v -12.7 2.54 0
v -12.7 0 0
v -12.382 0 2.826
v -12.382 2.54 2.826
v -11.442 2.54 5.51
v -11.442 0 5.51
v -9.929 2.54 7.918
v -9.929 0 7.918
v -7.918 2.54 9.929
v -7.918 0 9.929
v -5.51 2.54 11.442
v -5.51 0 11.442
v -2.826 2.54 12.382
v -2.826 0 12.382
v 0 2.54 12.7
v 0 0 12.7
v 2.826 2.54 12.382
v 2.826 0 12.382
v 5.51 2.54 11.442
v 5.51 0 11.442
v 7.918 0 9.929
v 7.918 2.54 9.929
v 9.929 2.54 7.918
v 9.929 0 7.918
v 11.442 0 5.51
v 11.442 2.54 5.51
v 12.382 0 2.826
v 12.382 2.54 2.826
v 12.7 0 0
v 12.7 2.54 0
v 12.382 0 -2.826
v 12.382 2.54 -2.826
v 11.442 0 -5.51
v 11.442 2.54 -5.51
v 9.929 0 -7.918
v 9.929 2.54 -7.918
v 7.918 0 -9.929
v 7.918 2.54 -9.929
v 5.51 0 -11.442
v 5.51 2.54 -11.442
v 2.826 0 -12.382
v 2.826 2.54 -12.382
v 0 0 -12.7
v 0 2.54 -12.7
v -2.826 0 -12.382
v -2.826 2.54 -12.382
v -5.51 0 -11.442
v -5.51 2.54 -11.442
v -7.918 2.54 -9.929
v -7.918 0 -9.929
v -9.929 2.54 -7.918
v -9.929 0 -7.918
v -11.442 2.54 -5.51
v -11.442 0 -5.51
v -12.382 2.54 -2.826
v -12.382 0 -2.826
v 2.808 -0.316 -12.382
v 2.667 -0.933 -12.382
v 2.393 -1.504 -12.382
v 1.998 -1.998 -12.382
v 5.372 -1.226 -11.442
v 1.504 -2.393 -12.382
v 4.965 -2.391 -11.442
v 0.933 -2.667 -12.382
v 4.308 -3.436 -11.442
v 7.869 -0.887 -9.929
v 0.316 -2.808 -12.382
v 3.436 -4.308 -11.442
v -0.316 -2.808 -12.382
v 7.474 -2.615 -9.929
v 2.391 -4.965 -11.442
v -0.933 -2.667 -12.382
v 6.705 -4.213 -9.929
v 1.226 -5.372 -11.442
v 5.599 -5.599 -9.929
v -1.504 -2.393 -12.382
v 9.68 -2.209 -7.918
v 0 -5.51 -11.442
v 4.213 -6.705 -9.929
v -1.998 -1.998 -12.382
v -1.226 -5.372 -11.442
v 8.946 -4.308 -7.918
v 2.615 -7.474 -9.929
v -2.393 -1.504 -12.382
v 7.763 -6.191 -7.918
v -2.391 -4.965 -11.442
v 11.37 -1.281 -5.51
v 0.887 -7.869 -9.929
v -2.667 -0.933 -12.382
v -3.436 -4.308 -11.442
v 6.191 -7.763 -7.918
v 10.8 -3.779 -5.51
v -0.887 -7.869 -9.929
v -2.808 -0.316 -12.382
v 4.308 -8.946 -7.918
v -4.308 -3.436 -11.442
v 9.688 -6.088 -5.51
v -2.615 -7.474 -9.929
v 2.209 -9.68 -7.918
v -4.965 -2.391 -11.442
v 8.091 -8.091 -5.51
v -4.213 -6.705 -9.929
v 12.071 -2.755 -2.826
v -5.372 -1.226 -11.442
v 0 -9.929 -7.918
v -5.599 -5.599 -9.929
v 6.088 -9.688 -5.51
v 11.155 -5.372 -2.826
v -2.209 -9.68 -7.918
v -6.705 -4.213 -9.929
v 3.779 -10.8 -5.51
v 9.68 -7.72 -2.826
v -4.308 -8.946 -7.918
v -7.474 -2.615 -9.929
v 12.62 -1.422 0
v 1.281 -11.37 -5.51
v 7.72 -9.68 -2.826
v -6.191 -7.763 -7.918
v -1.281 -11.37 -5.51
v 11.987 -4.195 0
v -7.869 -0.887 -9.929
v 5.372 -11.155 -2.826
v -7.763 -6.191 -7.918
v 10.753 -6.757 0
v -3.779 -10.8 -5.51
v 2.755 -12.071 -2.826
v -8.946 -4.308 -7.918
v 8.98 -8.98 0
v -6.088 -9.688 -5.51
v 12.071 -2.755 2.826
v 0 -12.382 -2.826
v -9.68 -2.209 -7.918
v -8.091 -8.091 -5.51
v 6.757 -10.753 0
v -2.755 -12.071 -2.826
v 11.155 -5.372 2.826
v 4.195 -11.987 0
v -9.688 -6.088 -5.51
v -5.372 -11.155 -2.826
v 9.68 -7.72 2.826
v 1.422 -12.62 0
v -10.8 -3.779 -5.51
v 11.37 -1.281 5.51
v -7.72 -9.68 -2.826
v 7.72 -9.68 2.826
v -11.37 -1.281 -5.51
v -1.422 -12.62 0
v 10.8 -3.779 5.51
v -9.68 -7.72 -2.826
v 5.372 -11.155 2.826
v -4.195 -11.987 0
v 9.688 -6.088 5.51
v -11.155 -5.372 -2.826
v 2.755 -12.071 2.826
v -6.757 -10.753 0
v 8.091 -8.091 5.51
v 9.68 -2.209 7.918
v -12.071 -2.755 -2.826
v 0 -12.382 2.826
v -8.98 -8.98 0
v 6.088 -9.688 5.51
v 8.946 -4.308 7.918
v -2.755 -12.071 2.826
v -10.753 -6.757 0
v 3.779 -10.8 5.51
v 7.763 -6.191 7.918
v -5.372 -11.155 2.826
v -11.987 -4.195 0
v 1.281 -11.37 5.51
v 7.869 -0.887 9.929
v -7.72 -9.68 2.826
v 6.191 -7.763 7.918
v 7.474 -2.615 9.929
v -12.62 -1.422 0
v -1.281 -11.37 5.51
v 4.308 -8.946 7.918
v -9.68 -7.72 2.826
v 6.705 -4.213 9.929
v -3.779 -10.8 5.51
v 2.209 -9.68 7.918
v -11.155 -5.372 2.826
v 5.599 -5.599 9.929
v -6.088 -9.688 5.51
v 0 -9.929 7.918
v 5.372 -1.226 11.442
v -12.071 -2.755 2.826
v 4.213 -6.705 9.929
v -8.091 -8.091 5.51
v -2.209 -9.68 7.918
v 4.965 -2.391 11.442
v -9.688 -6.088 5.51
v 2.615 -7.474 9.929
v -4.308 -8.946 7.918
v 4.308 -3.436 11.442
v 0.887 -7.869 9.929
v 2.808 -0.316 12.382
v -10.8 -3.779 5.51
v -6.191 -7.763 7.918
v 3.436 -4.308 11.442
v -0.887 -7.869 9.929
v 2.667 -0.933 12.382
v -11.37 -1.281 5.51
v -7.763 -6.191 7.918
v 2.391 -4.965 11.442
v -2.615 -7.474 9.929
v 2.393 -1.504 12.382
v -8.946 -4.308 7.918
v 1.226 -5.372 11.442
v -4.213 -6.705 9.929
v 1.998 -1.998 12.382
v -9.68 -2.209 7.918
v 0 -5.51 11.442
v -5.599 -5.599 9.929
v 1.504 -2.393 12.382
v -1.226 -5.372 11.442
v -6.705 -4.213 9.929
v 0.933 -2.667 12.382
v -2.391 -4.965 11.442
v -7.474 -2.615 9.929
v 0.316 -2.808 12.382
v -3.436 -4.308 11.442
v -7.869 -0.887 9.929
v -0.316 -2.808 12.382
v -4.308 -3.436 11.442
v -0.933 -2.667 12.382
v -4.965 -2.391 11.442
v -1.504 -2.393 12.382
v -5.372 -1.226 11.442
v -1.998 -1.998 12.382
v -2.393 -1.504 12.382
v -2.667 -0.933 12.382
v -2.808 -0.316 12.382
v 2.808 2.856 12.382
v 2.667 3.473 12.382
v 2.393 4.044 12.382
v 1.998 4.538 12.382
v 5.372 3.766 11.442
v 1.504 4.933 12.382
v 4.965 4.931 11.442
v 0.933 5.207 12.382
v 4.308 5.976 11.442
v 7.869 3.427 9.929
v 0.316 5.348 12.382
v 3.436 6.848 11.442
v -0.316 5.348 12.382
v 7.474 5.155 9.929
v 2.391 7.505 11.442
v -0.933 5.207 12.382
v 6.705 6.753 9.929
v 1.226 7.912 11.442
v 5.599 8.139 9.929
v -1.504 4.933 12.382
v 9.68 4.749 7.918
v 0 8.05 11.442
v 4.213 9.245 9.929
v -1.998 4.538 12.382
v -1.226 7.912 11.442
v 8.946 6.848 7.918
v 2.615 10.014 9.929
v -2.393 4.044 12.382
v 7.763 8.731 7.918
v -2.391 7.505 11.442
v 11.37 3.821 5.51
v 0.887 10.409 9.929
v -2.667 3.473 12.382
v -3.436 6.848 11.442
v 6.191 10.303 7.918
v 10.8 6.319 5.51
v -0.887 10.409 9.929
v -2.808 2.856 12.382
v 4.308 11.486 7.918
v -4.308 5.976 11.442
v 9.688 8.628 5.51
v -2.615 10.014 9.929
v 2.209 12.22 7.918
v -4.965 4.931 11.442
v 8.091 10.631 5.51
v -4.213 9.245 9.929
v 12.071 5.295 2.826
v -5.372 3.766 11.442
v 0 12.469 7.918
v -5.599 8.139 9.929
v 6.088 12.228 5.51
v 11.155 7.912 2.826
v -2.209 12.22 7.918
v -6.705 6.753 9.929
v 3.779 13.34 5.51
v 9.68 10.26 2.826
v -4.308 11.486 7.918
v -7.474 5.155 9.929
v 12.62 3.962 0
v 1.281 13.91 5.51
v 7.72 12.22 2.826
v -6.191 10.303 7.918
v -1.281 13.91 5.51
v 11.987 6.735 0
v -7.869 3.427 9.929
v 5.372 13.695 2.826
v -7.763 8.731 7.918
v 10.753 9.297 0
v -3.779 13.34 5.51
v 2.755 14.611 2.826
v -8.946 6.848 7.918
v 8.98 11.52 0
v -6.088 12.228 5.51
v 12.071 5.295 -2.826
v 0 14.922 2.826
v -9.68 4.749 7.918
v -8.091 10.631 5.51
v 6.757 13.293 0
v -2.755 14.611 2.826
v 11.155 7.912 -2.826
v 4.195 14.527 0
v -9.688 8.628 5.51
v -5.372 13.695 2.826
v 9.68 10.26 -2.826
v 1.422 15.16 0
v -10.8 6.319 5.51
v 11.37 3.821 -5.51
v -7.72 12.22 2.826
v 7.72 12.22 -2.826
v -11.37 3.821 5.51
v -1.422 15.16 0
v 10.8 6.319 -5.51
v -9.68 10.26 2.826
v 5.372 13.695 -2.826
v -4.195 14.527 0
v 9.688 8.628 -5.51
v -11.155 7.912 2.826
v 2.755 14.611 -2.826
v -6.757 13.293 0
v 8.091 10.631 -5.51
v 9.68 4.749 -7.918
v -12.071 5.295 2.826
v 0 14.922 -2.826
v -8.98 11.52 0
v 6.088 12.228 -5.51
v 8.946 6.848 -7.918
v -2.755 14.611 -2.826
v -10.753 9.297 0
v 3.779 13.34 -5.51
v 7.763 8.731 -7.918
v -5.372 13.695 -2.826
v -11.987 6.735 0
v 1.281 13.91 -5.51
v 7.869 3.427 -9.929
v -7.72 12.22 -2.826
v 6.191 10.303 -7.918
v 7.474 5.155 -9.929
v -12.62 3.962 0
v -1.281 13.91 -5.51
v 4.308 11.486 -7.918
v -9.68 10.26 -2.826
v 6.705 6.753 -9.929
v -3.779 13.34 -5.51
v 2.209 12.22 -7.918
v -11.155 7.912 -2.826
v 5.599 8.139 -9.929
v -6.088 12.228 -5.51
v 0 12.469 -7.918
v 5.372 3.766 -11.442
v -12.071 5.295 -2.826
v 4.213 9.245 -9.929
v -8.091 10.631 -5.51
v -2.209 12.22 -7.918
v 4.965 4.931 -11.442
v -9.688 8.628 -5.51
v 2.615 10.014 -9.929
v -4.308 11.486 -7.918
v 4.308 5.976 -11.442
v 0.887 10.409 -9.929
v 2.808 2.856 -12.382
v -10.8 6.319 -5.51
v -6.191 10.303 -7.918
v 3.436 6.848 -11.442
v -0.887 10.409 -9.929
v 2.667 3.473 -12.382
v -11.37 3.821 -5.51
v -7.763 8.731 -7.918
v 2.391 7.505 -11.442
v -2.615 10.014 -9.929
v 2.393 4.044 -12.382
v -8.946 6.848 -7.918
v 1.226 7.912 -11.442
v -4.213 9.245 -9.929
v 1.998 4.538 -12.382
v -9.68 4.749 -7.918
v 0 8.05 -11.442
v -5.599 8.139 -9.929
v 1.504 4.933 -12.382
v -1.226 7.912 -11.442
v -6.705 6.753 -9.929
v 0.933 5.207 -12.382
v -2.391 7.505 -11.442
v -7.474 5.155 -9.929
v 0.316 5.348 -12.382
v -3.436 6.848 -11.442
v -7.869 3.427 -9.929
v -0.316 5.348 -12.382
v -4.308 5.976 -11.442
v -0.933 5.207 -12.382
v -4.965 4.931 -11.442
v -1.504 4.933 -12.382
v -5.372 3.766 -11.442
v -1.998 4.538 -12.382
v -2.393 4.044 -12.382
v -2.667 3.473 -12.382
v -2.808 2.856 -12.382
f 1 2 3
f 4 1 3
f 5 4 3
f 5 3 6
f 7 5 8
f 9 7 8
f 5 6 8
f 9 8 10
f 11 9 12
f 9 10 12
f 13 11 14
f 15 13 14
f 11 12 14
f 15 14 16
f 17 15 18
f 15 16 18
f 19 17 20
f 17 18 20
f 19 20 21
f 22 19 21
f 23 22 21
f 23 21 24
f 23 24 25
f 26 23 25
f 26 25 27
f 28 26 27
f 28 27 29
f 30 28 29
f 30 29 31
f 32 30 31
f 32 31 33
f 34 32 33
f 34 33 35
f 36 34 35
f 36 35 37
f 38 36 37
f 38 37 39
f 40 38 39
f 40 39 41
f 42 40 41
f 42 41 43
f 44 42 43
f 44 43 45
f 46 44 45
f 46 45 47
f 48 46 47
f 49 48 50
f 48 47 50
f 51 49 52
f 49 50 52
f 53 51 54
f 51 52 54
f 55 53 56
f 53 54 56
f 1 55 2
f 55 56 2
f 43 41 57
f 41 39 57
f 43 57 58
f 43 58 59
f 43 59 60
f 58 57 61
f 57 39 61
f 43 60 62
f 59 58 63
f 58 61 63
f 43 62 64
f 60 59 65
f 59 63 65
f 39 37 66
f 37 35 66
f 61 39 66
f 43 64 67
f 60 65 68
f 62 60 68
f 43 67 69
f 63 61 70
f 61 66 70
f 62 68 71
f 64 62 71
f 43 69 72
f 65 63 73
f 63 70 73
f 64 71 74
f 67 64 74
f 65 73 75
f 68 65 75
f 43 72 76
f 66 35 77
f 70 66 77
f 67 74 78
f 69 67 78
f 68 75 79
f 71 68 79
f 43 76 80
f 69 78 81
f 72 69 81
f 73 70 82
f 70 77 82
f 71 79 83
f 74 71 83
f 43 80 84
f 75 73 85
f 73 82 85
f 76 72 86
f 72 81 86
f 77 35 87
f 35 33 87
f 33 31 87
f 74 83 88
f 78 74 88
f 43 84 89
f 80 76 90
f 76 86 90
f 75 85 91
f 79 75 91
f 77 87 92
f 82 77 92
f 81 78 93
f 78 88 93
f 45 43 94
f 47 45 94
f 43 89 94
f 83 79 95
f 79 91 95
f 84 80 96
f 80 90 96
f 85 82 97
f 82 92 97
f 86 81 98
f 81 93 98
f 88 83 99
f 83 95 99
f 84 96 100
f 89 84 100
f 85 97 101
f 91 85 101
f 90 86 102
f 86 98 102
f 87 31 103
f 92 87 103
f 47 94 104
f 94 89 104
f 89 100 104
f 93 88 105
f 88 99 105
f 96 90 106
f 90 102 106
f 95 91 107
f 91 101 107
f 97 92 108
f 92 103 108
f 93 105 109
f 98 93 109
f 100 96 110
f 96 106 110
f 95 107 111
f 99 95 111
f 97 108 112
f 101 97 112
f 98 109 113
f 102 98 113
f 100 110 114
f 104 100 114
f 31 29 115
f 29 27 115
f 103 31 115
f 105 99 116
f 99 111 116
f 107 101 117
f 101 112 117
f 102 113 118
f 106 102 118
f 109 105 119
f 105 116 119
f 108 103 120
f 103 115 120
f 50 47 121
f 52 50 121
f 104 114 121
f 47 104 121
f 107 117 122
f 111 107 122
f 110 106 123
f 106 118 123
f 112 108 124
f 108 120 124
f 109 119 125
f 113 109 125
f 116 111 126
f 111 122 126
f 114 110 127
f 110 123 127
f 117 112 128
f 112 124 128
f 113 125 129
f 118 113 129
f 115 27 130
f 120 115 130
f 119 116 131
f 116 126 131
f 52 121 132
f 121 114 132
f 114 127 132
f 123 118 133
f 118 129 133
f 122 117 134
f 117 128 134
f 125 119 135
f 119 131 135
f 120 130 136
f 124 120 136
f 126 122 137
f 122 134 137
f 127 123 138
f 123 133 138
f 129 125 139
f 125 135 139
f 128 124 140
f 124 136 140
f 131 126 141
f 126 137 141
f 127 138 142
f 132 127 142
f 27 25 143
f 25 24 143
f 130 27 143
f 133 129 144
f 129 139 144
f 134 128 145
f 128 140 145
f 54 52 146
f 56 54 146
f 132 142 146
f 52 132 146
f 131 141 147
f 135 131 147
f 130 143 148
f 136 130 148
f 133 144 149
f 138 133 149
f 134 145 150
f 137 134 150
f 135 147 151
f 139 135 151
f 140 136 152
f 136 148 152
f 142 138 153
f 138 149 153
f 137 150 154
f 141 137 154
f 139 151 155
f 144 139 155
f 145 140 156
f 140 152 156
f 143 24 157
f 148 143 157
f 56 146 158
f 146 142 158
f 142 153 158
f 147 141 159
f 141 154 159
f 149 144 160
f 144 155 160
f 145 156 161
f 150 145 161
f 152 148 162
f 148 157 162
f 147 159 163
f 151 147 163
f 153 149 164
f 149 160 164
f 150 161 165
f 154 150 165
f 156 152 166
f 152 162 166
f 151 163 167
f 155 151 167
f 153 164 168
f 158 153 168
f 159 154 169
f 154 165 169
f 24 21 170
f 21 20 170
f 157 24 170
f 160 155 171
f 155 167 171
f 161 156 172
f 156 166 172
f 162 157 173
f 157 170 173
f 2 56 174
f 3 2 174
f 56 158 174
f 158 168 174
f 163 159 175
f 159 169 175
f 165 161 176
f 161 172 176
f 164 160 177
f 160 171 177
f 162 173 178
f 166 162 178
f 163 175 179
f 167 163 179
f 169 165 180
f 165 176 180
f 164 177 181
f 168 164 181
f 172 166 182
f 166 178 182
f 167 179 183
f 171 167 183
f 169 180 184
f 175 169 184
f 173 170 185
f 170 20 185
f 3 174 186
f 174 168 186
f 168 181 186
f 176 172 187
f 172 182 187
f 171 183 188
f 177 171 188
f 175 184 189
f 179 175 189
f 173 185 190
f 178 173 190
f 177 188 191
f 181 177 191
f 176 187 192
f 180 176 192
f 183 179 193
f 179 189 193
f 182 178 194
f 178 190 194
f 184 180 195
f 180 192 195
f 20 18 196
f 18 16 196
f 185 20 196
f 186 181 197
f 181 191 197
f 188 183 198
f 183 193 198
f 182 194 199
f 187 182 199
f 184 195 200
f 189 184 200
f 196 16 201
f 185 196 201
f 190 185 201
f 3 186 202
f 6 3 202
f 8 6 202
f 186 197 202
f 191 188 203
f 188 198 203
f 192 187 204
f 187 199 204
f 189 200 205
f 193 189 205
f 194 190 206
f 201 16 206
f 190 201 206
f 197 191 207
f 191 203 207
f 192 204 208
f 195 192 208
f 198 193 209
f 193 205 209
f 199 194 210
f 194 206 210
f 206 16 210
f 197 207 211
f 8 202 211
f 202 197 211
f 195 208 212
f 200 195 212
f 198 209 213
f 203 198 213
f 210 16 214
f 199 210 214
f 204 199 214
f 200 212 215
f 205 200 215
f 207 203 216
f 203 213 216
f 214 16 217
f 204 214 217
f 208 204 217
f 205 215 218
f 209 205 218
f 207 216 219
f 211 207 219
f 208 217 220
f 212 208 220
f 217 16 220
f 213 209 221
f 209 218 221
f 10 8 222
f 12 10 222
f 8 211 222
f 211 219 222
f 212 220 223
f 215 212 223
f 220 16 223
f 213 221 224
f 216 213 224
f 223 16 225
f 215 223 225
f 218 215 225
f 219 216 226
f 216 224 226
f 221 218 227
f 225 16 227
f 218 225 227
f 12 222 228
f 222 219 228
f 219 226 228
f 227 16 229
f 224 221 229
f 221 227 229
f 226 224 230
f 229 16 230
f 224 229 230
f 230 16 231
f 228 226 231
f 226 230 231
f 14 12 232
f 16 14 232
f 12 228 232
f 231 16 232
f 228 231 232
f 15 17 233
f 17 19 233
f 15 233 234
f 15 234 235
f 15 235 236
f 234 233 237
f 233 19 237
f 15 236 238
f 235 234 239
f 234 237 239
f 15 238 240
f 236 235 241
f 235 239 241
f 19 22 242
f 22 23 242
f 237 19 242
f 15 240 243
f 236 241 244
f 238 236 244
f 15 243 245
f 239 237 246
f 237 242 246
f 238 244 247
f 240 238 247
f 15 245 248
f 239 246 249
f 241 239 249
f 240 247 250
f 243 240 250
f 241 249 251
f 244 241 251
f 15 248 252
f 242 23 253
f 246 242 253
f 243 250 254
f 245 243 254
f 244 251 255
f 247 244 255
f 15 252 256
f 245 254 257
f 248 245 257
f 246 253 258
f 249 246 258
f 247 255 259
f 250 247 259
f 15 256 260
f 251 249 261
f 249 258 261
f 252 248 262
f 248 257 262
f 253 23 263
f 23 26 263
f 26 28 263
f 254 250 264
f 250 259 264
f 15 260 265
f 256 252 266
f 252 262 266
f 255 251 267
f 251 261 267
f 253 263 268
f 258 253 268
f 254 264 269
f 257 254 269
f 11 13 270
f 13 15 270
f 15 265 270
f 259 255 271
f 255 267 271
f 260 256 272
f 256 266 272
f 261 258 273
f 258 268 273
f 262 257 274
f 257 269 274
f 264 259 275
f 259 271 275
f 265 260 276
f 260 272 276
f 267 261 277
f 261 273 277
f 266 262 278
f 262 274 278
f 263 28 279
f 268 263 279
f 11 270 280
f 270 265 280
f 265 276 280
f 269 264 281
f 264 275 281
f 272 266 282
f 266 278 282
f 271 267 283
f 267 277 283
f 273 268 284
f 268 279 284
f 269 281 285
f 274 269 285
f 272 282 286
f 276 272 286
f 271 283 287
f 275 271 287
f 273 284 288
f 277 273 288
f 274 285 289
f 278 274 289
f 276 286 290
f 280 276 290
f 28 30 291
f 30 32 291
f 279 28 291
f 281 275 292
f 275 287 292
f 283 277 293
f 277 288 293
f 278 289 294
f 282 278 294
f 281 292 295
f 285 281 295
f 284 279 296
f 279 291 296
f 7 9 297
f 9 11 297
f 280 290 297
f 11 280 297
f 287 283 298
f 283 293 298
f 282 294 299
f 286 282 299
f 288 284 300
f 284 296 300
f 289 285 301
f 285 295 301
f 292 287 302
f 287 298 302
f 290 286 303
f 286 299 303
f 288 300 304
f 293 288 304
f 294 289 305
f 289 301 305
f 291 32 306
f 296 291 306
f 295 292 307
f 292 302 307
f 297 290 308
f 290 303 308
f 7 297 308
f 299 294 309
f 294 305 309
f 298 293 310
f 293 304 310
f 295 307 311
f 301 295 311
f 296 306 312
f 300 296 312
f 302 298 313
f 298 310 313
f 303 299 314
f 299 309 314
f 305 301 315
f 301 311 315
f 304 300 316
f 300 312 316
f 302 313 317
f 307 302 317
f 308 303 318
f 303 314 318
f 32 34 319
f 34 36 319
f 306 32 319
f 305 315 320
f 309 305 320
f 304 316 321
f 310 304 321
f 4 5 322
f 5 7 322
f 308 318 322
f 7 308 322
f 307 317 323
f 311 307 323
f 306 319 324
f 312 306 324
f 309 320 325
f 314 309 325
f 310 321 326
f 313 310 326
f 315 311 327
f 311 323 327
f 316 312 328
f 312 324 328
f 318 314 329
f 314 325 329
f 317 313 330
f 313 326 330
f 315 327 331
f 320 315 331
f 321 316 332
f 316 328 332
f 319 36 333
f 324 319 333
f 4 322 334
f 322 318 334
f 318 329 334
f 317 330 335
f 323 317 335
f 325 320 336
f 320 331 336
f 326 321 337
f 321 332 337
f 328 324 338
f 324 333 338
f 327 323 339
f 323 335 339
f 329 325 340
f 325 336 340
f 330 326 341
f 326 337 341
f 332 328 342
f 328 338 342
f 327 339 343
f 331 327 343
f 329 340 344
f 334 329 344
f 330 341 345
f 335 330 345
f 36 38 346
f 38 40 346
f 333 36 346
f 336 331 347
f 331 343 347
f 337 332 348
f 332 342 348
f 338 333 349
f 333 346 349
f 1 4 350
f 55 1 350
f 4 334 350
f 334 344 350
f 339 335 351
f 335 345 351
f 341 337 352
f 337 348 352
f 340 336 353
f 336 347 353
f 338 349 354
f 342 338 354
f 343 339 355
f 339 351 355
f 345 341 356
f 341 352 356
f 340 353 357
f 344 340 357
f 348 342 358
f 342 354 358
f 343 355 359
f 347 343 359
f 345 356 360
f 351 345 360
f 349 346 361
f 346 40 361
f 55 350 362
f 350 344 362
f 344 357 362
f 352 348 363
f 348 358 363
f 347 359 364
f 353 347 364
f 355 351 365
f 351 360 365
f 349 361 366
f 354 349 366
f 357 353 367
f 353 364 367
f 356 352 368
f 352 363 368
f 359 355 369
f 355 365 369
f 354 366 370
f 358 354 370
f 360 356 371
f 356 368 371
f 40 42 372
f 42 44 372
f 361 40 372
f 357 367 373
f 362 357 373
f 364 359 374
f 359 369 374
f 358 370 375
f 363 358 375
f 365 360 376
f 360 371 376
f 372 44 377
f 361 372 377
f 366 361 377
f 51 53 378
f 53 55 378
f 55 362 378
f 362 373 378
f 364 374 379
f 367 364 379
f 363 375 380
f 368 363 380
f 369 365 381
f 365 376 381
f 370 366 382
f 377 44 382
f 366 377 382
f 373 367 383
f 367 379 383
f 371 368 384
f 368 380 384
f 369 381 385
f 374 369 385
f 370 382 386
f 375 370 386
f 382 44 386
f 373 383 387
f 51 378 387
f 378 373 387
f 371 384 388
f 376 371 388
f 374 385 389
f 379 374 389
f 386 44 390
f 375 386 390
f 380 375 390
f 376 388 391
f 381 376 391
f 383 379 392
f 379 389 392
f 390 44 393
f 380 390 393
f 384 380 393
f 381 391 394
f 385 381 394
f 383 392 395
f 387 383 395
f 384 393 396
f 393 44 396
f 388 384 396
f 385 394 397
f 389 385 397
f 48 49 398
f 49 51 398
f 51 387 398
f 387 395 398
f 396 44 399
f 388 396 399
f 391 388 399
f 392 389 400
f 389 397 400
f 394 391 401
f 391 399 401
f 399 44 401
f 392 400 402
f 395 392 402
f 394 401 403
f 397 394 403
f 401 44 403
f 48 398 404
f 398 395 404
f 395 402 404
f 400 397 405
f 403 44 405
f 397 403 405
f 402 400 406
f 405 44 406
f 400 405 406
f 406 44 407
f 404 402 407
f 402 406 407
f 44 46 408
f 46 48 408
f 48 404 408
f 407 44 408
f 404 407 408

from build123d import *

# Parameters (mm, degrees)
REVOLVE2_ANGLE      = 180
SKETCH2_R           = 12.7
BOSS_EXTRUDE1_DEPTH = 2.54
REVOLVE3_ANGLE      = 180


with BuildPart() as part:
    # Sketch1 → Revolve2 (revolve)
    with BuildSketch(Plane(origin=(0, 0, 0), x_dir=(1, 0, 0), z_dir=(0, 1, 0))):
        with BuildLine():
            Line((0, -12.7), (0, 12.7))
            ThreePointArc((0, 12.7), (12.7, 0), (0, -12.7))
        make_face()
    revolve(axis=Axis((0, 0, 12.7), (0, 0, -1)), revolution_arc=REVOLVE2_ANGLE)

    # Sketch2 → Boss-Extrude1 (add)
    with BuildSketch(Plane(origin=(0, 0, 0), x_dir=(1, 0, 0), z_dir=(0, 1, 0))):
        with Locations(Location((0, 0, 0), (0, 0, 180))):
            Circle(SKETCH2_R)
    extrude(amount=BOSS_EXTRUDE1_DEPTH)

    # Sketch3 → Revolve3 (revolve)
    with BuildSketch(Plane(origin=(0, 2.54, 0), x_dir=(1, 0, 0), z_dir=(0, 1, 0))):
        with BuildLine():
            Line((0, 12.7), (0, -12.7))
            ThreePointArc((0, -12.7), (12.7, 0), (0, 12.7))
        make_face()
    revolve(axis=Axis((0, 2.54, -12.7), (0, 0, 1)), revolution_arc=REVOLVE3_ANGLE)


solid = part.part
